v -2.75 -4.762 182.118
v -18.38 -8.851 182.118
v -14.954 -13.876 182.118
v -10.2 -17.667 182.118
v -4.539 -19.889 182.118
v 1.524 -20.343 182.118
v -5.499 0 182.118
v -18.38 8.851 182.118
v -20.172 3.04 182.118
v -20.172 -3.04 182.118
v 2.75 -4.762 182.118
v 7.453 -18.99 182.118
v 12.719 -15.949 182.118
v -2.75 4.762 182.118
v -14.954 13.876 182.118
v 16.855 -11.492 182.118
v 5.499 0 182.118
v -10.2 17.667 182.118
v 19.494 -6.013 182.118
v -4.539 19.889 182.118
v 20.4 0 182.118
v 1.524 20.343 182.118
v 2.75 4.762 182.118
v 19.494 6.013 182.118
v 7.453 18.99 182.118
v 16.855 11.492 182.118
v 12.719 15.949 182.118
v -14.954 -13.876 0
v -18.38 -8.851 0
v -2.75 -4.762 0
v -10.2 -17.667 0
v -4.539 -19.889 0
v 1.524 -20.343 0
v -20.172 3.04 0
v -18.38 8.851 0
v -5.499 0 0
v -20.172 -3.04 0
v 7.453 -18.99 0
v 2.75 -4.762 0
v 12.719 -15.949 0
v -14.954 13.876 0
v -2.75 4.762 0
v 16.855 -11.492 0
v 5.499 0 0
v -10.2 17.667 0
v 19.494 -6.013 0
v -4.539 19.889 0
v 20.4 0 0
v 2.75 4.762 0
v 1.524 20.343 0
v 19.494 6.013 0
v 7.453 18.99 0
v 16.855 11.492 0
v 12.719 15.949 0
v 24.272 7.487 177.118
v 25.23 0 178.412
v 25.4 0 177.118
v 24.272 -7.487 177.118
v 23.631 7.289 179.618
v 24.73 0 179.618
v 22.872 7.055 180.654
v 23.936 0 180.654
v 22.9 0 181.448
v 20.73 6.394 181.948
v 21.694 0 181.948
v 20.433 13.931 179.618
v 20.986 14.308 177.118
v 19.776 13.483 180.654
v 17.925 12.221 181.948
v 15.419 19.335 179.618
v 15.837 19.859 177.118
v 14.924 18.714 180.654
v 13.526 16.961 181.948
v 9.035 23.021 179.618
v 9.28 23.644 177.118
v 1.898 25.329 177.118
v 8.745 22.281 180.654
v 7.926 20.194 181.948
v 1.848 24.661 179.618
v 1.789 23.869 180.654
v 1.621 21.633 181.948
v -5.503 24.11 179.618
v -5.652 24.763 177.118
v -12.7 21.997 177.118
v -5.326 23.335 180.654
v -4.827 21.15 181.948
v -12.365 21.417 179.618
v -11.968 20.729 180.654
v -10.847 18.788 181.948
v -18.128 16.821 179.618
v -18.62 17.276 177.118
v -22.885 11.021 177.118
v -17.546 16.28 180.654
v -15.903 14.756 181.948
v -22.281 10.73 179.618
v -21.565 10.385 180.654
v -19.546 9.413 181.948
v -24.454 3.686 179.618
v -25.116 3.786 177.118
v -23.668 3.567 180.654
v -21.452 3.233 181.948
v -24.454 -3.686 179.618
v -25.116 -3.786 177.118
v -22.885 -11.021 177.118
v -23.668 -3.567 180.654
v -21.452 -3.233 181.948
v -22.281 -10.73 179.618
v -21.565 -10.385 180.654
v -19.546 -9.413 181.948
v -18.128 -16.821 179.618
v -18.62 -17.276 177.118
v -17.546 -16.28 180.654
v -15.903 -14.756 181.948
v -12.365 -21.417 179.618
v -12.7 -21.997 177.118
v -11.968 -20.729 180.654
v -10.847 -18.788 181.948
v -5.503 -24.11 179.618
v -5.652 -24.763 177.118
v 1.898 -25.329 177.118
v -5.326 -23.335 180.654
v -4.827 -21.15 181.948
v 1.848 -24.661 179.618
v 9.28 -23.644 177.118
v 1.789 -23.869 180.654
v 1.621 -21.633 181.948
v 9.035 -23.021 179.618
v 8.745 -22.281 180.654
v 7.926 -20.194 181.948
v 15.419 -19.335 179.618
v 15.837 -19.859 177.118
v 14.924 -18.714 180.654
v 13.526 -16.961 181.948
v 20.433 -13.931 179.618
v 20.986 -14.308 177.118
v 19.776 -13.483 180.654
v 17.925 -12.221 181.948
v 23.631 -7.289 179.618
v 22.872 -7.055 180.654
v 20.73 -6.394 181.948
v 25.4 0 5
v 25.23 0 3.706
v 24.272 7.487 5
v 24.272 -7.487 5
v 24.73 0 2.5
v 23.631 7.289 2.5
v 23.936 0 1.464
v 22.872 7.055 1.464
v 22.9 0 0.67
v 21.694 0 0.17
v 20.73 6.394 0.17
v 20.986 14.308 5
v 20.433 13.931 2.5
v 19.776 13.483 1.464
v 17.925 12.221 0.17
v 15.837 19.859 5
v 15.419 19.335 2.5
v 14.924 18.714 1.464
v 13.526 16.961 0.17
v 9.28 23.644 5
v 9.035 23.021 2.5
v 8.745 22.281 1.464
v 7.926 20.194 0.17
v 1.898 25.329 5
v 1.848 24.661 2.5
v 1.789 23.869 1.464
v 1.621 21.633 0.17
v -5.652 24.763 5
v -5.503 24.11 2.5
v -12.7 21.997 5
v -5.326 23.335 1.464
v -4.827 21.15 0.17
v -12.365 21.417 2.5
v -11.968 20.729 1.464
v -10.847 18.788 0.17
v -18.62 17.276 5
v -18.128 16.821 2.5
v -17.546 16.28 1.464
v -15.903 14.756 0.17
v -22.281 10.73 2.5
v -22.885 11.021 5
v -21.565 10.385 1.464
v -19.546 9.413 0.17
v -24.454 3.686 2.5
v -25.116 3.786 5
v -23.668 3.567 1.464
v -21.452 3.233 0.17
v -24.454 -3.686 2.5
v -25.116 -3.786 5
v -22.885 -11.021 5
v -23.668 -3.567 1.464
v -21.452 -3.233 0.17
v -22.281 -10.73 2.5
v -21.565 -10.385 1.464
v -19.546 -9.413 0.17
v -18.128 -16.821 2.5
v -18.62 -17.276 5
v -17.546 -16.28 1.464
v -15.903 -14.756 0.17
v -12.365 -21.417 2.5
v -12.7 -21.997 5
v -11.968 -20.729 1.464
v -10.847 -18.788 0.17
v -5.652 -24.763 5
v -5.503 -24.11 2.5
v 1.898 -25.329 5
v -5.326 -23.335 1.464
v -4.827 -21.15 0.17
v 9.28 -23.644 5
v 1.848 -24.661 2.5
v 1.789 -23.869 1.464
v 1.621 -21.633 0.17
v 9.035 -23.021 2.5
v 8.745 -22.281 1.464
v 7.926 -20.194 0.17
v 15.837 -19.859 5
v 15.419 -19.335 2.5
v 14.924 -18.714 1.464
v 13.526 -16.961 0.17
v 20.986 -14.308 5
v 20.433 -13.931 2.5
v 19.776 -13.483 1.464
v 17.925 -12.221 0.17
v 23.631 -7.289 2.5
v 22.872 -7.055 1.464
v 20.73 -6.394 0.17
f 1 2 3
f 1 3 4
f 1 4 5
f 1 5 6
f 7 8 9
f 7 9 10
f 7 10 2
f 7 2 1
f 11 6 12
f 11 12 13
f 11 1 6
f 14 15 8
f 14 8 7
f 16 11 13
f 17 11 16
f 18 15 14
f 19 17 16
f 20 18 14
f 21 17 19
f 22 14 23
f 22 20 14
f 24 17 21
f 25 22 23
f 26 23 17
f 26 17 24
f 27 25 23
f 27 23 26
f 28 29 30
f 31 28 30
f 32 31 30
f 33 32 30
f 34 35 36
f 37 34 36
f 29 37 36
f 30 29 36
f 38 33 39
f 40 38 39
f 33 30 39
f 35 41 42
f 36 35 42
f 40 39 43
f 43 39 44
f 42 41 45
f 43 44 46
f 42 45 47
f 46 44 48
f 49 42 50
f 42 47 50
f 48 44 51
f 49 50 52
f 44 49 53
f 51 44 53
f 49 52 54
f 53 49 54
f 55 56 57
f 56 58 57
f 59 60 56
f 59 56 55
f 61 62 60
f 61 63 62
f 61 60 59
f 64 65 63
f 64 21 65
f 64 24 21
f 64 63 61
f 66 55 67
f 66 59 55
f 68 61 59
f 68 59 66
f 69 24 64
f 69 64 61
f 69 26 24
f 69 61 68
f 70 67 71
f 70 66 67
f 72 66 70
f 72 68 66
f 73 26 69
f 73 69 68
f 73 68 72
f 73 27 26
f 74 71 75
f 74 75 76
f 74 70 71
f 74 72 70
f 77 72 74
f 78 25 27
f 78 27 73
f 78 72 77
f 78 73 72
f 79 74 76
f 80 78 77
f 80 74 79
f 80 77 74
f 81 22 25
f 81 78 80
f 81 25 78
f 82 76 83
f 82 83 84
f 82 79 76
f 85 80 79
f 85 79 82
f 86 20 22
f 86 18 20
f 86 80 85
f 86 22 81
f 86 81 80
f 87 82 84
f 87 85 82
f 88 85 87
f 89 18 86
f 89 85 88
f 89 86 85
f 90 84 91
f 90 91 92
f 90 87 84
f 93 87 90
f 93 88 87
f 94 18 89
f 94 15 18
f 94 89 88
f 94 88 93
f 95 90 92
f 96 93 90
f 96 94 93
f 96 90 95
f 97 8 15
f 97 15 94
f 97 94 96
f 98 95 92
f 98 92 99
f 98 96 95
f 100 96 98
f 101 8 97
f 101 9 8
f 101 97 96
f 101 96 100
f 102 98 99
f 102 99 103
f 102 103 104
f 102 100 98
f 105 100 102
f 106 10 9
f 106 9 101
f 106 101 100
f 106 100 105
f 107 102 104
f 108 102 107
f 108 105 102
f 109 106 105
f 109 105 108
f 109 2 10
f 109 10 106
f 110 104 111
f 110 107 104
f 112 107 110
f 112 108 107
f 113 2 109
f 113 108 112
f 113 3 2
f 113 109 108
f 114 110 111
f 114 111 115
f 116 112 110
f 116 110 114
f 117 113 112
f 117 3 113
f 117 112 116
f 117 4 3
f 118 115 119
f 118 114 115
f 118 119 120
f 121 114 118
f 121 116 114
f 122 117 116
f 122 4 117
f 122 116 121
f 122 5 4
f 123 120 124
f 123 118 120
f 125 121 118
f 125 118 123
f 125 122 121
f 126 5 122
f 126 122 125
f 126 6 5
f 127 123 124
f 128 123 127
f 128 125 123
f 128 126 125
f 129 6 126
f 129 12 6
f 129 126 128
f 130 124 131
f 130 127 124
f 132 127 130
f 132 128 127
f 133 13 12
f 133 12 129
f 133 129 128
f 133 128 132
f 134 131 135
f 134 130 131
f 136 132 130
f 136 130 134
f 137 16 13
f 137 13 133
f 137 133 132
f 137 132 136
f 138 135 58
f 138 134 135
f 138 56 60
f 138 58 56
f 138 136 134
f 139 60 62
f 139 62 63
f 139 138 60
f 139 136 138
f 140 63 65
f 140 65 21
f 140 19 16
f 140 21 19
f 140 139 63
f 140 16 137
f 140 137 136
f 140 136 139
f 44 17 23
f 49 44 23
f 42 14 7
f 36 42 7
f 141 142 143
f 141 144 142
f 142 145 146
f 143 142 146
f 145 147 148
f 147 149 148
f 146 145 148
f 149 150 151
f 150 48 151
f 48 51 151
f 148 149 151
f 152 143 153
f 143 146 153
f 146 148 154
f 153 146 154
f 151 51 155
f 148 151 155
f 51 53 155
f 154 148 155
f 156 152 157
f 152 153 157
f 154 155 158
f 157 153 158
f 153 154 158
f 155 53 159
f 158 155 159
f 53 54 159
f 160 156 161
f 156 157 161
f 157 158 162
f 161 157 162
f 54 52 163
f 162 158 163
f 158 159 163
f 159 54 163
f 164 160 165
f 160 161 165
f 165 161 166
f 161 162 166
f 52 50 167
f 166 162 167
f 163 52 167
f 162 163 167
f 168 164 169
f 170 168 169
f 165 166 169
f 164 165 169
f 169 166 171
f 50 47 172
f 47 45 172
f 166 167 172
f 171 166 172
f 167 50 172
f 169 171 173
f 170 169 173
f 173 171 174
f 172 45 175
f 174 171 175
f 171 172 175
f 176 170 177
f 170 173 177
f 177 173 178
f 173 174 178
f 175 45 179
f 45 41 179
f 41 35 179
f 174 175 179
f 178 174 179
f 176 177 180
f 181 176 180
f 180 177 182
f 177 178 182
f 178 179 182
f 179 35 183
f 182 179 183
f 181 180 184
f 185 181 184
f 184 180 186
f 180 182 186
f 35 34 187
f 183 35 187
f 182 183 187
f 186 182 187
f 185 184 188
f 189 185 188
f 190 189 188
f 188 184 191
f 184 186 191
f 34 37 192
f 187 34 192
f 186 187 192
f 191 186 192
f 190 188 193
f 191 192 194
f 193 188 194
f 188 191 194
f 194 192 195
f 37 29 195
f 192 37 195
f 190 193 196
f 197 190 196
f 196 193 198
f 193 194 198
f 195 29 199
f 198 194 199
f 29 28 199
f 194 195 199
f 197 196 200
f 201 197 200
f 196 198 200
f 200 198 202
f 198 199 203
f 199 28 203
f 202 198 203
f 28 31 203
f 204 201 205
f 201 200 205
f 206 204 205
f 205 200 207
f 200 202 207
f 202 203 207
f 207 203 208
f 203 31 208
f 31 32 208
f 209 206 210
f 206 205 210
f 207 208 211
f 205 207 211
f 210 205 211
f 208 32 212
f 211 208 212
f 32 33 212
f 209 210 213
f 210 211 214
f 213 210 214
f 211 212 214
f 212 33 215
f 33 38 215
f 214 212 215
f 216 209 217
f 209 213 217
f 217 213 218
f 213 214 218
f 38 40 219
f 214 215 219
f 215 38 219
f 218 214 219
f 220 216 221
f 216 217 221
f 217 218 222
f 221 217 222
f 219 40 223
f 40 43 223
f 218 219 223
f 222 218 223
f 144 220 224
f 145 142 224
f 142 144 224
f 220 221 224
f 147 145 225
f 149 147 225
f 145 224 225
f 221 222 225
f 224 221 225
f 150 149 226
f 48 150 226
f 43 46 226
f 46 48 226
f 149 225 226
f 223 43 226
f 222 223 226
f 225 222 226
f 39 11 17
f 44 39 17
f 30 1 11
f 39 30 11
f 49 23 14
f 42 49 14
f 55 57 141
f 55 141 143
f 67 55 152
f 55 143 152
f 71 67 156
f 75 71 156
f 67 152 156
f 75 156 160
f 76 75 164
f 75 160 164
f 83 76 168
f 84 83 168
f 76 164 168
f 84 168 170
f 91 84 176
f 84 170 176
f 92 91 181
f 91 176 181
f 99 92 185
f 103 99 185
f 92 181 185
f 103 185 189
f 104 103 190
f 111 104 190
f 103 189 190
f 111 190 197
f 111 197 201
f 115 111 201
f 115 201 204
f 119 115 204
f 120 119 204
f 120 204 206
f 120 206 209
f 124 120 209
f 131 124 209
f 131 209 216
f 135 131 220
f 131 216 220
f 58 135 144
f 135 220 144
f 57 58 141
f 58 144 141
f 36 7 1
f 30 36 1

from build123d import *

# Parameters (mm, degrees)
SKETCH1_R           = 25.4
BOSS_EXTRUDE1_DEPTH = 182.118
CUT_EXTRUDE1_DEPTH  = 183.118
FILLET1_R           = 5


with BuildPart() as part:
    # Sketch1 → Boss-Extrude1 (new body)
    with BuildSketch(Plane.XY):
        Circle(SKETCH1_R)
    extrude(amount=BOSS_EXTRUDE1_DEPTH)

    # Sketch2 → Cut-Extrude1 (cut, through all)
    with BuildSketch(Plane.XY.offset(182.118)):
        Polygon((5.499261314, 0), (2.749630657, 4.7625), (-2.749630657, 4.7625), (-5.499261314, 0), (-2.749630657, -4.7625), (2.749630657, -4.7625), align=None)
    extrude(amount=-CUT_EXTRUDE1_DEPTH, mode=Mode.SUBTRACT)

    # Fillet1
    fillet1_edges = [part.edges().sort_by_distance(p)[0] for p in [
        (-25.4, 0, 0),
        (-25.4, 0, 182.118),
    ]]
    fillet(fillet1_edges, radius=FILLET1_R)


solid = part.part
